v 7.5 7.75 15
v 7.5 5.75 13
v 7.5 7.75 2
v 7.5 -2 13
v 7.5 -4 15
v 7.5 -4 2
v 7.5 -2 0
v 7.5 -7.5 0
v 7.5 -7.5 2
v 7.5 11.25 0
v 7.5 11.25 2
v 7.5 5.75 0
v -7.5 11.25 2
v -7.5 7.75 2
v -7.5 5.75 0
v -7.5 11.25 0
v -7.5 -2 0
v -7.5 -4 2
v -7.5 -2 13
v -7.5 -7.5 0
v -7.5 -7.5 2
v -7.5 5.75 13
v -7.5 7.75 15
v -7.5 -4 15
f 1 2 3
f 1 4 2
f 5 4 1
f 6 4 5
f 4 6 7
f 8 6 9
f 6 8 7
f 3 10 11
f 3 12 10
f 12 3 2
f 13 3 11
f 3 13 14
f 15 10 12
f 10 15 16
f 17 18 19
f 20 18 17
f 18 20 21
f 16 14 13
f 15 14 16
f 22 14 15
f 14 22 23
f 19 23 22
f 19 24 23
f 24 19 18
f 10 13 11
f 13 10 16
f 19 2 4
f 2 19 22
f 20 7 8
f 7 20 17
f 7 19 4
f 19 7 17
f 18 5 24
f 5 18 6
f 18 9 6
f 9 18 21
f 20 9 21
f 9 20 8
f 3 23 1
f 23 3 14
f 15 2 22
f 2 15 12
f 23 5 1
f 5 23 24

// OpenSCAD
union () {
  translate ([0.000, 8.750, 1.000]) {
    cube (size = [ 15.000, 5.000, 2.000], center = true);
  }
  translate ([0.000, 0.000, 6.500]) {
    translate ([0.000, -3.000, 0.000]) {
      cube (size = [ 15.000, 2.000, 13.000], center = true);
    }
  }
  translate ([0.000, -5.000, 1.000]) {
    cube (size = [ 15.000, 5.000, 2.000], center = true);
  }
  translate ([0.000, 0.000, 6.500]) {
    translate ([0.000, 6.750, 0.000]) {
      cube (size = [ 15.000, 2.000, 13.000], center = true);
    }
  }
  translate ([0.000, 1.875, 14.000]) {
    cube (size = [ 15.000, 11.750, 2.000], center = true);
  }
}
